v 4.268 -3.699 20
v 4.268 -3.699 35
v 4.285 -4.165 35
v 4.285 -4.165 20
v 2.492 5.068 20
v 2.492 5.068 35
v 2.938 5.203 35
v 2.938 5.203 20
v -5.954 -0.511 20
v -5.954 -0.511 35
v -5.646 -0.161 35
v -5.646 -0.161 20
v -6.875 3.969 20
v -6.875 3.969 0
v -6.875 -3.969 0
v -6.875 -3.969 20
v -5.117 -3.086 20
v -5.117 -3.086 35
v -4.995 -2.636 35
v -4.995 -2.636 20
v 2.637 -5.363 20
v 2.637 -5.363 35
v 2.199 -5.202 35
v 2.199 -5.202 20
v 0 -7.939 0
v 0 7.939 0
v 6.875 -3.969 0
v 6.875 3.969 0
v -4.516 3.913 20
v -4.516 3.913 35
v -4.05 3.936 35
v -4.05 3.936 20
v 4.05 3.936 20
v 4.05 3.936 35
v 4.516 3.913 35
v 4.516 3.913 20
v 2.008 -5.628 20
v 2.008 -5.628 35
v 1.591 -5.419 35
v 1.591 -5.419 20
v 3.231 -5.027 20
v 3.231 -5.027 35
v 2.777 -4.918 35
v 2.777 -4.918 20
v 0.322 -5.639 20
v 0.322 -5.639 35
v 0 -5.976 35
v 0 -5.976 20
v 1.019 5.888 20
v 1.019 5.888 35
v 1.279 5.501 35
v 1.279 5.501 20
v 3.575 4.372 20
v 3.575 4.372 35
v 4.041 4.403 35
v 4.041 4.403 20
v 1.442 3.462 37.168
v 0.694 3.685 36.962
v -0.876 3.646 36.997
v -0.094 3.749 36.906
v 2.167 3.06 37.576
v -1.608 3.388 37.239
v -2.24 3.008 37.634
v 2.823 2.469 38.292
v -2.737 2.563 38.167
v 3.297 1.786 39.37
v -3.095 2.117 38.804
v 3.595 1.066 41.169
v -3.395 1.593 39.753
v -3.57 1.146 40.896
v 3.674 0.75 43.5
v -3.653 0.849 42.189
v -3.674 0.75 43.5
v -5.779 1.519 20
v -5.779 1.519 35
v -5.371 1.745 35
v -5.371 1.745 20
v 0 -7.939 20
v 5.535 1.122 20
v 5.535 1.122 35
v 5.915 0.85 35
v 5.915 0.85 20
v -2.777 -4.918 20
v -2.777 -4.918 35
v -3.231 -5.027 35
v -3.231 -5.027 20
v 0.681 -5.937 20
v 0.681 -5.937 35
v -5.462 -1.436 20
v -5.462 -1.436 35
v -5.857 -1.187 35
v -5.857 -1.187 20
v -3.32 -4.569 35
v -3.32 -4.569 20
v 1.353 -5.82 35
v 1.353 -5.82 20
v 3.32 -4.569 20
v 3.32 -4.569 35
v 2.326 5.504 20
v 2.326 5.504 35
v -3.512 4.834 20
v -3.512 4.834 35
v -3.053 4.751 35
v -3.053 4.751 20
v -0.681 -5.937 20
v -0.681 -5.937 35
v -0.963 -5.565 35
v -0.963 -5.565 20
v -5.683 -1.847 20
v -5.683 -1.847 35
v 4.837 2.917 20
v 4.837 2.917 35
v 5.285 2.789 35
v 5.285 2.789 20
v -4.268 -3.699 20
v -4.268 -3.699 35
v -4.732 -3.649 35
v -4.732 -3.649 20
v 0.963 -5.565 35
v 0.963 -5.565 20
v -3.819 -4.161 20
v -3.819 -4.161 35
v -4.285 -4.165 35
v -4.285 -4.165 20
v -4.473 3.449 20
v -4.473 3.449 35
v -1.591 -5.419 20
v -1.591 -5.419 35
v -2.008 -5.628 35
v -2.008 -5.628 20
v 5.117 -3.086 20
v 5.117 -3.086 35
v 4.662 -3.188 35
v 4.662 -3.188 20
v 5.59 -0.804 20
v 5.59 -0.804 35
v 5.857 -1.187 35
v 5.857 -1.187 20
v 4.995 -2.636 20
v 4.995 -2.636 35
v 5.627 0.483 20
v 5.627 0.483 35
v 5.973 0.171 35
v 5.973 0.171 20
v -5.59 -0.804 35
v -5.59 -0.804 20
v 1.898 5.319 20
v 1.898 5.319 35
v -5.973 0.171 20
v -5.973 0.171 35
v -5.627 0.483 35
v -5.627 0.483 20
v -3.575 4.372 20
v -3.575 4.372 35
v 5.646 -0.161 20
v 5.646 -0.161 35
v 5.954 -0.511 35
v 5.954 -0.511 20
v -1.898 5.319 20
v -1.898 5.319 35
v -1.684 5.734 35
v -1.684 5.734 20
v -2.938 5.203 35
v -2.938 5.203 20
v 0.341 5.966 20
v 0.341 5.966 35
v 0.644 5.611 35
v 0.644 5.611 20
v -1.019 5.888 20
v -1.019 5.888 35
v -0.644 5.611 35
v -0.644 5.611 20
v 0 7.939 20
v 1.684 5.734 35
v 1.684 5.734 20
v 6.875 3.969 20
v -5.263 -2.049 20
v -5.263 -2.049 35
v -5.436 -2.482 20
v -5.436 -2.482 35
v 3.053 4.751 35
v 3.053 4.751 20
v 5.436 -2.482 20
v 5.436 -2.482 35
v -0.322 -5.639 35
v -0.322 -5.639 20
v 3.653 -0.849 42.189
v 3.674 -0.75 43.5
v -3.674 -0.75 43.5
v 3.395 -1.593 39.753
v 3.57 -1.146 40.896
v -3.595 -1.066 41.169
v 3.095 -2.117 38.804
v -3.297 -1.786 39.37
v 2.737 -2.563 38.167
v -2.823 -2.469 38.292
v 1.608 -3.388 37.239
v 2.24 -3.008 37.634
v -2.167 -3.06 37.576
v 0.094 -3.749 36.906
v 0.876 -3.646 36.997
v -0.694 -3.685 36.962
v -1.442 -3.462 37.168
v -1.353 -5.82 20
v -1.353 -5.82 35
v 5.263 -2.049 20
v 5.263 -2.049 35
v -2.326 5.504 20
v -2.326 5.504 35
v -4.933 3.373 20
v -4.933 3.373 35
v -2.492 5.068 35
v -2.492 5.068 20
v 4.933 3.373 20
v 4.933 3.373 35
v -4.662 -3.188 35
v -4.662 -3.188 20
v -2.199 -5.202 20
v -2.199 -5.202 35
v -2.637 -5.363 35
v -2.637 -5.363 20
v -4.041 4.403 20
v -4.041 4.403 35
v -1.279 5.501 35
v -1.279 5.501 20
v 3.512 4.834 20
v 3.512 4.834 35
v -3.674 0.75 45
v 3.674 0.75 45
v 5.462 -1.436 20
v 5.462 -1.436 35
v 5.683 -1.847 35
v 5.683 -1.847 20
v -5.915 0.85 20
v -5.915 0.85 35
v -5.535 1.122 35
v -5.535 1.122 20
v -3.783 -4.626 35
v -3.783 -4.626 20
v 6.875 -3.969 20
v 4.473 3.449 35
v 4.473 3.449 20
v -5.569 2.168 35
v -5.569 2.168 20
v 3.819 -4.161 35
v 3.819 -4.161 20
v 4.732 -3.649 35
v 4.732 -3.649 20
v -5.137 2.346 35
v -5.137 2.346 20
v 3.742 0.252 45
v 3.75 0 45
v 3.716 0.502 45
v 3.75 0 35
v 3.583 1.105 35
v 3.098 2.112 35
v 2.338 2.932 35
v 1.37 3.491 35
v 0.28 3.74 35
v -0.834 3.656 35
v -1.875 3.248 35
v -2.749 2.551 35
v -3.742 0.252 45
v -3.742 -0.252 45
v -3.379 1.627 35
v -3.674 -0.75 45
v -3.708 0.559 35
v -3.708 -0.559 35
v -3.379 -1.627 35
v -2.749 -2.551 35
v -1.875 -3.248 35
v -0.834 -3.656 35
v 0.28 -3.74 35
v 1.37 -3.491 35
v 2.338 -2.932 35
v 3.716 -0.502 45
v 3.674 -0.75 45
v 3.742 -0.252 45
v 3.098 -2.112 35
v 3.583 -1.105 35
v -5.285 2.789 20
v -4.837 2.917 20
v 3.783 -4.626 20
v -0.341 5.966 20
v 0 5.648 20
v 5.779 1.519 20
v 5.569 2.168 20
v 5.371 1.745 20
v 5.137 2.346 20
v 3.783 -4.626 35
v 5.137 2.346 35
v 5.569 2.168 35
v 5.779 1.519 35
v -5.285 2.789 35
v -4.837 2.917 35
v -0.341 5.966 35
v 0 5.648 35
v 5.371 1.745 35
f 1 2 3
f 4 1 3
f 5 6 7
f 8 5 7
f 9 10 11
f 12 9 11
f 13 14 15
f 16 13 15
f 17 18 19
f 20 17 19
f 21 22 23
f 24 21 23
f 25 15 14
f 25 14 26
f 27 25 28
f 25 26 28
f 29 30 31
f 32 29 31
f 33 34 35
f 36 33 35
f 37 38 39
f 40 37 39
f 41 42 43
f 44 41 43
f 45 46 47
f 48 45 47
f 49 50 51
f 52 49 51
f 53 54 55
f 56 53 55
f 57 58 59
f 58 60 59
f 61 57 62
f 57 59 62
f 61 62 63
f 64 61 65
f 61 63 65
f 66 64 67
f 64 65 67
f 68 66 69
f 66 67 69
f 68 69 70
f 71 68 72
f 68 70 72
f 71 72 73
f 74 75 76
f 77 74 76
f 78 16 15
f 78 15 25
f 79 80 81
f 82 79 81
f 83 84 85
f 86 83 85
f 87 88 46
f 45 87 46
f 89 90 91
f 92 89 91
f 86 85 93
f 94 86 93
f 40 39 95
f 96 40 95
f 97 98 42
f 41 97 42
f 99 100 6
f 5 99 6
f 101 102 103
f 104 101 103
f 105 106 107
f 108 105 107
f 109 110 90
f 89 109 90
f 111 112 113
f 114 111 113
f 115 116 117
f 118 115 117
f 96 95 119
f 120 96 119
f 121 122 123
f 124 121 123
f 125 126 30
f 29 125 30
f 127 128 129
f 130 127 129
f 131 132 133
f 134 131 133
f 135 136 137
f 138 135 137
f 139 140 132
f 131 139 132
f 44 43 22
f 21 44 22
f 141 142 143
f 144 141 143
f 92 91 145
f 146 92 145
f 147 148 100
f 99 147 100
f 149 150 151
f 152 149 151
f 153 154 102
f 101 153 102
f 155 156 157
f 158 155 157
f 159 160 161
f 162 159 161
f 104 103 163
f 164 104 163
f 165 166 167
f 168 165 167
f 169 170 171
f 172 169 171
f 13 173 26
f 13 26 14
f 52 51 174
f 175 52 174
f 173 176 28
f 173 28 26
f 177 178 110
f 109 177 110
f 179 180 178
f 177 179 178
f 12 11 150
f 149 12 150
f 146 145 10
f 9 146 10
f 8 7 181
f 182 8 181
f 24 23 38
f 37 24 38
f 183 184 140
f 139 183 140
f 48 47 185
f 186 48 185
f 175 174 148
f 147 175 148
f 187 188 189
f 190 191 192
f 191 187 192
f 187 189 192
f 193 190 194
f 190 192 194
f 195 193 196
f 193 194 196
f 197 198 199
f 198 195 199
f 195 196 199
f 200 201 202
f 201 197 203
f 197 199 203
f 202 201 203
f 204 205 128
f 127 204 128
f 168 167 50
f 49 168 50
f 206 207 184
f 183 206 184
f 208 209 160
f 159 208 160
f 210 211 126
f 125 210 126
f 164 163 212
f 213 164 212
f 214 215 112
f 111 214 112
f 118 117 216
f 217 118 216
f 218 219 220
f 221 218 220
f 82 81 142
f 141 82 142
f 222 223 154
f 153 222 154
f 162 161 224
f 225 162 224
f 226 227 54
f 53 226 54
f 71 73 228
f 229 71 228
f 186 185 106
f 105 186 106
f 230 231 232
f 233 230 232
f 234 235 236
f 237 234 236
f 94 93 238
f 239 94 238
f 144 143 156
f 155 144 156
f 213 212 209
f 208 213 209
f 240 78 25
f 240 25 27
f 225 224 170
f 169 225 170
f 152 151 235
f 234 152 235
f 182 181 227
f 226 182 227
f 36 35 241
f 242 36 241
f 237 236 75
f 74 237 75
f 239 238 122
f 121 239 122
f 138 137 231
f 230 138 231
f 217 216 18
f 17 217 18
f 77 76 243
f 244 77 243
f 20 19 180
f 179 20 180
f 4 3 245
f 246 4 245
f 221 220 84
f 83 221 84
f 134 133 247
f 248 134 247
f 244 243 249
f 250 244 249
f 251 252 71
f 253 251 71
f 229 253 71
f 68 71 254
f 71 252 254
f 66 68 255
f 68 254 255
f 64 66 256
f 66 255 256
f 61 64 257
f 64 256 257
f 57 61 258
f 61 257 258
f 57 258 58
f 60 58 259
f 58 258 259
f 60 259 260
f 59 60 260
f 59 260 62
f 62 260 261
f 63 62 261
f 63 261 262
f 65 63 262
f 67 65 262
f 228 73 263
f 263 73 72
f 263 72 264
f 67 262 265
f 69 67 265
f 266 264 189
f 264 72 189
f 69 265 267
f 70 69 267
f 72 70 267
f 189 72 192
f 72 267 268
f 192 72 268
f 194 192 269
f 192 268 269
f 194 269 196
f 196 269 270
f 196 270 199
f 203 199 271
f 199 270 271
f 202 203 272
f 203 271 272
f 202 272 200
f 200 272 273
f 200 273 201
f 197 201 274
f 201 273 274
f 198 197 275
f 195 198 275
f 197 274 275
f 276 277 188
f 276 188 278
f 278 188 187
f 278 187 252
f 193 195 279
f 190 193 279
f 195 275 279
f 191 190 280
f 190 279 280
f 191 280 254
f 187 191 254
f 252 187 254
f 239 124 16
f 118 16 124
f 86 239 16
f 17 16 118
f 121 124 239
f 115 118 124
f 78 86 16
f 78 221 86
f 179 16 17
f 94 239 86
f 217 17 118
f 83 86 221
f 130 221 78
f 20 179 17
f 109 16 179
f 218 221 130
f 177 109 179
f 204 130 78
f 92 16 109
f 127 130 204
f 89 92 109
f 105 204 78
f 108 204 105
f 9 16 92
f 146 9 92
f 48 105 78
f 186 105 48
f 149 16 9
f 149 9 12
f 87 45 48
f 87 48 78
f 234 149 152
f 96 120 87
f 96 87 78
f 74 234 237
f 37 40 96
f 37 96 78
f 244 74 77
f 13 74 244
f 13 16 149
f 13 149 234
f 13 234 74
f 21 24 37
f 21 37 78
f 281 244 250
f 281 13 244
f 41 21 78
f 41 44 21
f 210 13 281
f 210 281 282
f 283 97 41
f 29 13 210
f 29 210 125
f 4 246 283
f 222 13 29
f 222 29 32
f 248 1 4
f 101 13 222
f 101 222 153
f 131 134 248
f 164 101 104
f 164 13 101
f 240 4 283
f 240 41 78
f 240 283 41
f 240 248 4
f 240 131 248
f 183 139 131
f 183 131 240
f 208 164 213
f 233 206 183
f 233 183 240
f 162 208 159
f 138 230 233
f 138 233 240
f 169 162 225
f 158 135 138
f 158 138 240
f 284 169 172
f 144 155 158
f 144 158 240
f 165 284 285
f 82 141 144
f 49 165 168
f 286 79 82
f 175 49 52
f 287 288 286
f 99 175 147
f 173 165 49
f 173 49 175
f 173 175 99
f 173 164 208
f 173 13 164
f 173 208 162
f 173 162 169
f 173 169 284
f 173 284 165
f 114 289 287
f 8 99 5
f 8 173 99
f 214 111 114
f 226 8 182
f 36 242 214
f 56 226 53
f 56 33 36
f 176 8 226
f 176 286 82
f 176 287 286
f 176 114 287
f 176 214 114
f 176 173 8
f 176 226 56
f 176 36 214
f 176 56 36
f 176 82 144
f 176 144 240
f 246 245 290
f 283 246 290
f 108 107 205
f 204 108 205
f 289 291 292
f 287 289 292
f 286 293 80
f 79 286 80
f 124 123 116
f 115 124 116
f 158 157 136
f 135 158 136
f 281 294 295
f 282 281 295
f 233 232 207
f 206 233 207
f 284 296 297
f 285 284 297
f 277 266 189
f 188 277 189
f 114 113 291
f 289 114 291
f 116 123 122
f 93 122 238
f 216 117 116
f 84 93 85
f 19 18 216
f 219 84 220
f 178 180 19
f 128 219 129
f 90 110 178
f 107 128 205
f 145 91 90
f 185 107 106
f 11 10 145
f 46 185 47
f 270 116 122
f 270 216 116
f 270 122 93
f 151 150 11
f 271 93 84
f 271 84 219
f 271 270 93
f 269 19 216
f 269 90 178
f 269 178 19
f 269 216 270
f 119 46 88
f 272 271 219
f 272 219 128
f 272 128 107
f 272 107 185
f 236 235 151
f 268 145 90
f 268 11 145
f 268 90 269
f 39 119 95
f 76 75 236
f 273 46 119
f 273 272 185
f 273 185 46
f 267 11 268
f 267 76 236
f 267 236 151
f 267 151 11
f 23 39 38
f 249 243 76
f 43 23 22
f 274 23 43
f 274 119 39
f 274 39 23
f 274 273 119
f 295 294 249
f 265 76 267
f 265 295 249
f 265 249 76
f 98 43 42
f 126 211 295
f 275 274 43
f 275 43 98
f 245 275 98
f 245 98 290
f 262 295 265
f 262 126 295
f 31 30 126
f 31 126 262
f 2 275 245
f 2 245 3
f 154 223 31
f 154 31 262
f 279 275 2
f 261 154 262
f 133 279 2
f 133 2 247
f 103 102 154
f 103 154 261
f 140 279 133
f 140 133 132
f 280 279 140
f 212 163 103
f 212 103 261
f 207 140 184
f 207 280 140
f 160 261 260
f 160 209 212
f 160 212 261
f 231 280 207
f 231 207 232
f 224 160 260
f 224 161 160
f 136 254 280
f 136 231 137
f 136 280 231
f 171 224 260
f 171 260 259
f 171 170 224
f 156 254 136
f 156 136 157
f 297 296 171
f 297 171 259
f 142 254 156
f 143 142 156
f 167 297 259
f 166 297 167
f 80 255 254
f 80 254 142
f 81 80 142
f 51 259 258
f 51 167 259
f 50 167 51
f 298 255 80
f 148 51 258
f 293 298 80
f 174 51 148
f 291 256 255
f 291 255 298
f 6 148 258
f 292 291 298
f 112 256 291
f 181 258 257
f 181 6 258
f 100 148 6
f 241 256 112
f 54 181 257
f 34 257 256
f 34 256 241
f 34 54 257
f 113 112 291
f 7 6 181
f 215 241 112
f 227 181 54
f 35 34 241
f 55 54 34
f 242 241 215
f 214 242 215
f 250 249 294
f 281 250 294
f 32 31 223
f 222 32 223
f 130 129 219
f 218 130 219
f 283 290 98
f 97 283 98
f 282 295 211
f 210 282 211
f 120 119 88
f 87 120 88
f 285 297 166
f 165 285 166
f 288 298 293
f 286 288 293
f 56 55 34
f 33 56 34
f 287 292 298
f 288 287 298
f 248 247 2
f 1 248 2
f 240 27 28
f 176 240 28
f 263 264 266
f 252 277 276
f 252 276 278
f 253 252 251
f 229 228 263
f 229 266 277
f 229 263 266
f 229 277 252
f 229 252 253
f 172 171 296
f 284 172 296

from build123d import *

# Parameters (mm, degrees)
F1_DEPTH  = 20
F2_R      = 6
F3_DEPTH  = 15
F5_DEPTH  = 15
F6_COUNT  = 55
F8_R      = 3.75
F9_DEPTH  = 10
F11_DEPTH = 25


with BuildPart() as f1:
    # F0 (on Top) → F1 (new body)
    with BuildSketch(Plane.XY):
        Polygon((6.875, -3.969283), (6.875, 3.969283), (0, 7.938566), (-6.875, 3.969283), (-6.875, -3.969283), (0, -7.938566), align=None)
    extrude(amount=F1_DEPTH)

    # F2 (on face) → F3 (join)
    with BuildSketch(Plane.XY.offset(20)):
        Circle(F2_R)
    extrude(amount=F3_DEPTH)


with BuildPart() as f5:
    # F4 (on face) → F5 (new body, through all)
    with BuildSketch(Plane.XY.offset(35)):
        with BuildLine():
            ThreePointArc((0.365715, 5.988844), (0, 6), (-0.365715, 5.988844))
            Line((-0.365715, 5.988844), (0, 5.647886))
            Line((0, 5.647886), (0.365715, 5.988844))
        make_face()
    extrude(amount=-F5_DEPTH)


with BuildPart() as f6_1:
    # F6: instance of F5
    add(f5.part.rotate(Axis((0, 0, 35), (0, 0, -1)), 1 * 360 / F6_COUNT))


with BuildPart() as f6_2:
    # F6: instance of F5
    add(f5.part.rotate(Axis((0, 0, 35), (0, 0, -1)), 2 * 360 / F6_COUNT))


with BuildPart() as f6_3:
    # F6: instance of F5
    add(f5.part.rotate(Axis((0, 0, 35), (0, 0, -1)), 3 * 360 / F6_COUNT))


with BuildPart() as f6_4:
    # F6: instance of F5
    add(f5.part.rotate(Axis((0, 0, 35), (0, 0, -1)), 4 * 360 / F6_COUNT))


with BuildPart() as f6_5:
    # F6: instance of F5
    add(f5.part.rotate(Axis((0, 0, 35), (0, 0, -1)), 5 * 360 / F6_COUNT))


with BuildPart() as f6_6:
    # F6: instance of F5
    add(f5.part.rotate(Axis((0, 0, 35), (0, 0, -1)), 6 * 360 / F6_COUNT))


with BuildPart() as f6_7:
    # F6: instance of F5
    add(f5.part.rotate(Axis((0, 0, 35), (0, 0, -1)), 7 * 360 / F6_COUNT))


with BuildPart() as f6_8:
    # F6: instance of F5
    add(f5.part.rotate(Axis((0, 0, 35), (0, 0, -1)), 8 * 360 / F6_COUNT))


with BuildPart() as f6_9:
    # F6: instance of F5
    add(f5.part.rotate(Axis((0, 0, 35), (0, 0, -1)), 9 * 360 / F6_COUNT))


with BuildPart() as f6_10:
    # F6: instance of F5
    add(f5.part.rotate(Axis((0, 0, 35), (0, 0, -1)), 10 * 360 / F6_COUNT))


with BuildPart() as f6_11:
    # F6: instance of F5
    add(f5.part.rotate(Axis((0, 0, 35), (0, 0, -1)), 11 * 360 / F6_COUNT))


with BuildPart() as f6_12:
    # F6: instance of F5
    add(f5.part.rotate(Axis((0, 0, 35), (0, 0, -1)), 12 * 360 / F6_COUNT))


with BuildPart() as f6_13:
    # F6: instance of F5
    add(f5.part.rotate(Axis((0, 0, 35), (0, 0, -1)), 13 * 360 / F6_COUNT))


with BuildPart() as f6_14:
    # F6: instance of F5
    add(f5.part.rotate(Axis((0, 0, 35), (0, 0, -1)), 14 * 360 / F6_COUNT))


with BuildPart() as f6_15:
    # F6: instance of F5
    add(f5.part.rotate(Axis((0, 0, 35), (0, 0, -1)), 15 * 360 / F6_COUNT))


with BuildPart() as f6_16:
    # F6: instance of F5
    add(f5.part.rotate(Axis((0, 0, 35), (0, 0, -1)), 16 * 360 / F6_COUNT))


with BuildPart() as f6_17:
    # F6: instance of F5
    add(f5.part.rotate(Axis((0, 0, 35), (0, 0, -1)), 17 * 360 / F6_COUNT))


with BuildPart() as f6_18:
    # F6: instance of F5
    add(f5.part.rotate(Axis((0, 0, 35), (0, 0, -1)), 18 * 360 / F6_COUNT))


with BuildPart() as f6_19:
    # F6: instance of F5
    add(f5.part.rotate(Axis((0, 0, 35), (0, 0, -1)), 19 * 360 / F6_COUNT))


with BuildPart() as f6_20:
    # F6: instance of F5
    add(f5.part.rotate(Axis((0, 0, 35), (0, 0, -1)), 20 * 360 / F6_COUNT))


with BuildPart() as f6_21:
    # F6: instance of F5
    add(f5.part.rotate(Axis((0, 0, 35), (0, 0, -1)), 21 * 360 / F6_COUNT))


with BuildPart() as f6_22:
    # F6: instance of F5
    add(f5.part.rotate(Axis((0, 0, 35), (0, 0, -1)), 22 * 360 / F6_COUNT))


with BuildPart() as f6_23:
    # F6: instance of F5
    add(f5.part.rotate(Axis((0, 0, 35), (0, 0, -1)), 23 * 360 / F6_COUNT))


with BuildPart() as f6_24:
    # F6: instance of F5
    add(f5.part.rotate(Axis((0, 0, 35), (0, 0, -1)), 24 * 360 / F6_COUNT))


with BuildPart() as f6_25:
    # F6: instance of F5
    add(f5.part.rotate(Axis((0, 0, 35), (0, 0, -1)), 25 * 360 / F6_COUNT))


with BuildPart() as f6_26:
    # F6: instance of F5
    add(f5.part.rotate(Axis((0, 0, 35), (0, 0, -1)), 26 * 360 / F6_COUNT))


with BuildPart() as f6_27:
    # F6: instance of F5
    add(f5.part.rotate(Axis((0, 0, 35), (0, 0, -1)), 27 * 360 / F6_COUNT))


with BuildPart() as f6_28:
    # F6: instance of F5
    add(f5.part.rotate(Axis((0, 0, 35), (0, 0, -1)), 28 * 360 / F6_COUNT))


with BuildPart() as f6_29:
    # F6: instance of F5
    add(f5.part.rotate(Axis((0, 0, 35), (0, 0, -1)), 29 * 360 / F6_COUNT))


with BuildPart() as f6_30:
    # F6: instance of F5
    add(f5.part.rotate(Axis((0, 0, 35), (0, 0, -1)), 30 * 360 / F6_COUNT))


with BuildPart() as f6_31:
    # F6: instance of F5
    add(f5.part.rotate(Axis((0, 0, 35), (0, 0, -1)), 31 * 360 / F6_COUNT))


with BuildPart() as f6_32:
    # F6: instance of F5
    add(f5.part.rotate(Axis((0, 0, 35), (0, 0, -1)), 32 * 360 / F6_COUNT))


with BuildPart() as f6_33:
    # F6: instance of F5
    add(f5.part.rotate(Axis((0, 0, 35), (0, 0, -1)), 33 * 360 / F6_COUNT))


with BuildPart() as f6_34:
    # F6: instance of F5
    add(f5.part.rotate(Axis((0, 0, 35), (0, 0, -1)), 34 * 360 / F6_COUNT))


with BuildPart() as f6_35:
    # F6: instance of F5
    add(f5.part.rotate(Axis((0, 0, 35), (0, 0, -1)), 35 * 360 / F6_COUNT))


with BuildPart() as f6_36:
    # F6: instance of F5
    add(f5.part.rotate(Axis((0, 0, 35), (0, 0, -1)), 36 * 360 / F6_COUNT))


with BuildPart() as f6_37:
    # F6: instance of F5
    add(f5.part.rotate(Axis((0, 0, 35), (0, 0, -1)), 37 * 360 / F6_COUNT))


with BuildPart() as f6_38:
    # F6: instance of F5
    add(f5.part.rotate(Axis((0, 0, 35), (0, 0, -1)), 38 * 360 / F6_COUNT))


with BuildPart() as f6_39:
    # F6: instance of F5
    add(f5.part.rotate(Axis((0, 0, 35), (0, 0, -1)), 39 * 360 / F6_COUNT))


with BuildPart() as f6_40:
    # F6: instance of F5
    add(f5.part.rotate(Axis((0, 0, 35), (0, 0, -1)), 40 * 360 / F6_COUNT))


with BuildPart() as f6_41:
    # F6: instance of F5
    add(f5.part.rotate(Axis((0, 0, 35), (0, 0, -1)), 41 * 360 / F6_COUNT))


with BuildPart() as f6_42:
    # F6: instance of F5
    add(f5.part.rotate(Axis((0, 0, 35), (0, 0, -1)), 42 * 360 / F6_COUNT))


with BuildPart() as f6_43:
    # F6: instance of F5
    add(f5.part.rotate(Axis((0, 0, 35), (0, 0, -1)), 43 * 360 / F6_COUNT))


with BuildPart() as f6_44:
    # F6: instance of F5
    add(f5.part.rotate(Axis((0, 0, 35), (0, 0, -1)), 44 * 360 / F6_COUNT))


with BuildPart() as f6_45:
    # F6: instance of F5
    add(f5.part.rotate(Axis((0, 0, 35), (0, 0, -1)), 45 * 360 / F6_COUNT))


with BuildPart() as f6_46:
    # F6: instance of F5
    add(f5.part.rotate(Axis((0, 0, 35), (0, 0, -1)), 46 * 360 / F6_COUNT))


with BuildPart() as f6_47:
    # F6: instance of F5
    add(f5.part.rotate(Axis((0, 0, 35), (0, 0, -1)), 47 * 360 / F6_COUNT))


with BuildPart() as f6_48:
    # F6: instance of F5
    add(f5.part.rotate(Axis((0, 0, 35), (0, 0, -1)), 48 * 360 / F6_COUNT))


with BuildPart() as f6_49:
    # F6: instance of F5
    add(f5.part.rotate(Axis((0, 0, 35), (0, 0, -1)), 49 * 360 / F6_COUNT))


with BuildPart() as f6_50:
    # F6: instance of F5
    add(f5.part.rotate(Axis((0, 0, 35), (0, 0, -1)), 50 * 360 / F6_COUNT))


with BuildPart() as f6_51:
    # F6: instance of F5
    add(f5.part.rotate(Axis((0, 0, 35), (0, 0, -1)), 51 * 360 / F6_COUNT))


with BuildPart() as f6_52:
    # F6: instance of F5
    add(f5.part.rotate(Axis((0, 0, 35), (0, 0, -1)), 52 * 360 / F6_COUNT))


with BuildPart() as f6_53:
    # F6: instance of F5
    add(f5.part.rotate(Axis((0, 0, 35), (0, 0, -1)), 53 * 360 / F6_COUNT))


with BuildPart() as f6_54:
    # F6: instance of F5
    add(f5.part.rotate(Axis((0, 0, 35), (0, 0, -1)), 54 * 360 / F6_COUNT))


with BuildPart() as f1_1:
    add(f1.part)

    # F7: cut F6_6, F6_8, F6_10, F6_7, F6_1, F6_4, F6_5, F6_3, F6_2, F5, F6_9, F6_11, F6_12, F6_13, F6_14, F6_15, F6_16, F6_17, F6_18, F6_19, F6_20, F6_21, F6_22, F6_23, F6_24, F6_25, F6_26, F6_27, F6_28, F6_29, F6_30, F6_31, F6_32, F6_33, F6_34, F6_35, F6_36, F6_37, F6_38, F6_39, F6_40, F6_41, F6_42, F6_43, F6_44, F6_45, F6_46, F6_47, F6_48, F6_49, F6_50, F6_51, F6_52, F6_53, F6_54
    add(f6_6.part, mode=Mode.SUBTRACT)
    add(f6_8.part, mode=Mode.SUBTRACT)
    add(f6_10.part, mode=Mode.SUBTRACT)
    add(f6_7.part, mode=Mode.SUBTRACT)
    add(f6_1.part, mode=Mode.SUBTRACT)
    add(f6_4.part, mode=Mode.SUBTRACT)
    add(f6_5.part, mode=Mode.SUBTRACT)
    add(f6_3.part, mode=Mode.SUBTRACT)
    add(f6_2.part, mode=Mode.SUBTRACT)
    add(f5.part, mode=Mode.SUBTRACT)
    add(f6_9.part, mode=Mode.SUBTRACT)
    add(f6_11.part, mode=Mode.SUBTRACT)
    add(f6_12.part, mode=Mode.SUBTRACT)
    add(f6_13.part, mode=Mode.SUBTRACT)
    add(f6_14.part, mode=Mode.SUBTRACT)
    add(f6_15.part, mode=Mode.SUBTRACT)
    add(f6_16.part, mode=Mode.SUBTRACT)
    add(f6_17.part, mode=Mode.SUBTRACT)
    add(f6_18.part, mode=Mode.SUBTRACT)
    add(f6_19.part, mode=Mode.SUBTRACT)
    add(f6_20.part, mode=Mode.SUBTRACT)
    add(f6_21.part, mode=Mode.SUBTRACT)
    add(f6_22.part, mode=Mode.SUBTRACT)
    add(f6_23.part, mode=Mode.SUBTRACT)
    add(f6_24.part, mode=Mode.SUBTRACT)
    add(f6_25.part, mode=Mode.SUBTRACT)
    add(f6_26.part, mode=Mode.SUBTRACT)
    add(f6_27.part, mode=Mode.SUBTRACT)
    add(f6_28.part, mode=Mode.SUBTRACT)
    add(f6_29.part, mode=Mode.SUBTRACT)
    add(f6_30.part, mode=Mode.SUBTRACT)
    add(f6_31.part, mode=Mode.SUBTRACT)
    add(f6_32.part, mode=Mode.SUBTRACT)
    add(f6_33.part, mode=Mode.SUBTRACT)
    add(f6_34.part, mode=Mode.SUBTRACT)
    add(f6_35.part, mode=Mode.SUBTRACT)
    add(f6_36.part, mode=Mode.SUBTRACT)
    add(f6_37.part, mode=Mode.SUBTRACT)
    add(f6_38.part, mode=Mode.SUBTRACT)
    add(f6_39.part, mode=Mode.SUBTRACT)
    add(f6_40.part, mode=Mode.SUBTRACT)
    add(f6_41.part, mode=Mode.SUBTRACT)
    add(f6_42.part, mode=Mode.SUBTRACT)
    add(f6_43.part, mode=Mode.SUBTRACT)
    add(f6_44.part, mode=Mode.SUBTRACT)
    add(f6_45.part, mode=Mode.SUBTRACT)
    add(f6_46.part, mode=Mode.SUBTRACT)
    add(f6_47.part, mode=Mode.SUBTRACT)
    add(f6_48.part, mode=Mode.SUBTRACT)
    add(f6_49.part, mode=Mode.SUBTRACT)
    add(f6_50.part, mode=Mode.SUBTRACT)
    add(f6_51.part, mode=Mode.SUBTRACT)
    add(f6_52.part, mode=Mode.SUBTRACT)
    add(f6_53.part, mode=Mode.SUBTRACT)
    add(f6_54.part, mode=Mode.SUBTRACT)

    # F8 (on face) → F9 (join)
    with BuildSketch(Plane.XY.offset(35)):
        Circle(F8_R)
    extrude(amount=F9_DEPTH)

    # F10 (on face) → F11 (cut)
    with BuildSketch(Plane(origin=(-6.875, 0, 0), x_dir=(0, -1, 0), z_dir=(-1, 0, 0))):
        with BuildLine():
            Line((-0.75, 49.5), (-0.75, 50))
            Line((-0.75, 50), (-4.25, 50))
            Line((-4.25, 50), (-4.25, 36.5))
            ThreePointArc((-4.25, 36.5), (-1.673762, 39.586881), (-0.75, 43.5))
            Line((-0.75, 43.5), (-0.75, 49.5))
        make_face()
        with BuildLine():
            Line((0.75, 50), (0.75, 43.5))
            ThreePointArc((0.75, 43.5), (1.673762, 39.586881), (4.25, 36.5))
            Line((4.25, 36.5), (4.25, 50))
            Line((4.25, 50), (0.75, 50))
        make_face()
    extrude(amount=-F11_DEPTH, mode=Mode.SUBTRACT)


solid = f1_1.part
